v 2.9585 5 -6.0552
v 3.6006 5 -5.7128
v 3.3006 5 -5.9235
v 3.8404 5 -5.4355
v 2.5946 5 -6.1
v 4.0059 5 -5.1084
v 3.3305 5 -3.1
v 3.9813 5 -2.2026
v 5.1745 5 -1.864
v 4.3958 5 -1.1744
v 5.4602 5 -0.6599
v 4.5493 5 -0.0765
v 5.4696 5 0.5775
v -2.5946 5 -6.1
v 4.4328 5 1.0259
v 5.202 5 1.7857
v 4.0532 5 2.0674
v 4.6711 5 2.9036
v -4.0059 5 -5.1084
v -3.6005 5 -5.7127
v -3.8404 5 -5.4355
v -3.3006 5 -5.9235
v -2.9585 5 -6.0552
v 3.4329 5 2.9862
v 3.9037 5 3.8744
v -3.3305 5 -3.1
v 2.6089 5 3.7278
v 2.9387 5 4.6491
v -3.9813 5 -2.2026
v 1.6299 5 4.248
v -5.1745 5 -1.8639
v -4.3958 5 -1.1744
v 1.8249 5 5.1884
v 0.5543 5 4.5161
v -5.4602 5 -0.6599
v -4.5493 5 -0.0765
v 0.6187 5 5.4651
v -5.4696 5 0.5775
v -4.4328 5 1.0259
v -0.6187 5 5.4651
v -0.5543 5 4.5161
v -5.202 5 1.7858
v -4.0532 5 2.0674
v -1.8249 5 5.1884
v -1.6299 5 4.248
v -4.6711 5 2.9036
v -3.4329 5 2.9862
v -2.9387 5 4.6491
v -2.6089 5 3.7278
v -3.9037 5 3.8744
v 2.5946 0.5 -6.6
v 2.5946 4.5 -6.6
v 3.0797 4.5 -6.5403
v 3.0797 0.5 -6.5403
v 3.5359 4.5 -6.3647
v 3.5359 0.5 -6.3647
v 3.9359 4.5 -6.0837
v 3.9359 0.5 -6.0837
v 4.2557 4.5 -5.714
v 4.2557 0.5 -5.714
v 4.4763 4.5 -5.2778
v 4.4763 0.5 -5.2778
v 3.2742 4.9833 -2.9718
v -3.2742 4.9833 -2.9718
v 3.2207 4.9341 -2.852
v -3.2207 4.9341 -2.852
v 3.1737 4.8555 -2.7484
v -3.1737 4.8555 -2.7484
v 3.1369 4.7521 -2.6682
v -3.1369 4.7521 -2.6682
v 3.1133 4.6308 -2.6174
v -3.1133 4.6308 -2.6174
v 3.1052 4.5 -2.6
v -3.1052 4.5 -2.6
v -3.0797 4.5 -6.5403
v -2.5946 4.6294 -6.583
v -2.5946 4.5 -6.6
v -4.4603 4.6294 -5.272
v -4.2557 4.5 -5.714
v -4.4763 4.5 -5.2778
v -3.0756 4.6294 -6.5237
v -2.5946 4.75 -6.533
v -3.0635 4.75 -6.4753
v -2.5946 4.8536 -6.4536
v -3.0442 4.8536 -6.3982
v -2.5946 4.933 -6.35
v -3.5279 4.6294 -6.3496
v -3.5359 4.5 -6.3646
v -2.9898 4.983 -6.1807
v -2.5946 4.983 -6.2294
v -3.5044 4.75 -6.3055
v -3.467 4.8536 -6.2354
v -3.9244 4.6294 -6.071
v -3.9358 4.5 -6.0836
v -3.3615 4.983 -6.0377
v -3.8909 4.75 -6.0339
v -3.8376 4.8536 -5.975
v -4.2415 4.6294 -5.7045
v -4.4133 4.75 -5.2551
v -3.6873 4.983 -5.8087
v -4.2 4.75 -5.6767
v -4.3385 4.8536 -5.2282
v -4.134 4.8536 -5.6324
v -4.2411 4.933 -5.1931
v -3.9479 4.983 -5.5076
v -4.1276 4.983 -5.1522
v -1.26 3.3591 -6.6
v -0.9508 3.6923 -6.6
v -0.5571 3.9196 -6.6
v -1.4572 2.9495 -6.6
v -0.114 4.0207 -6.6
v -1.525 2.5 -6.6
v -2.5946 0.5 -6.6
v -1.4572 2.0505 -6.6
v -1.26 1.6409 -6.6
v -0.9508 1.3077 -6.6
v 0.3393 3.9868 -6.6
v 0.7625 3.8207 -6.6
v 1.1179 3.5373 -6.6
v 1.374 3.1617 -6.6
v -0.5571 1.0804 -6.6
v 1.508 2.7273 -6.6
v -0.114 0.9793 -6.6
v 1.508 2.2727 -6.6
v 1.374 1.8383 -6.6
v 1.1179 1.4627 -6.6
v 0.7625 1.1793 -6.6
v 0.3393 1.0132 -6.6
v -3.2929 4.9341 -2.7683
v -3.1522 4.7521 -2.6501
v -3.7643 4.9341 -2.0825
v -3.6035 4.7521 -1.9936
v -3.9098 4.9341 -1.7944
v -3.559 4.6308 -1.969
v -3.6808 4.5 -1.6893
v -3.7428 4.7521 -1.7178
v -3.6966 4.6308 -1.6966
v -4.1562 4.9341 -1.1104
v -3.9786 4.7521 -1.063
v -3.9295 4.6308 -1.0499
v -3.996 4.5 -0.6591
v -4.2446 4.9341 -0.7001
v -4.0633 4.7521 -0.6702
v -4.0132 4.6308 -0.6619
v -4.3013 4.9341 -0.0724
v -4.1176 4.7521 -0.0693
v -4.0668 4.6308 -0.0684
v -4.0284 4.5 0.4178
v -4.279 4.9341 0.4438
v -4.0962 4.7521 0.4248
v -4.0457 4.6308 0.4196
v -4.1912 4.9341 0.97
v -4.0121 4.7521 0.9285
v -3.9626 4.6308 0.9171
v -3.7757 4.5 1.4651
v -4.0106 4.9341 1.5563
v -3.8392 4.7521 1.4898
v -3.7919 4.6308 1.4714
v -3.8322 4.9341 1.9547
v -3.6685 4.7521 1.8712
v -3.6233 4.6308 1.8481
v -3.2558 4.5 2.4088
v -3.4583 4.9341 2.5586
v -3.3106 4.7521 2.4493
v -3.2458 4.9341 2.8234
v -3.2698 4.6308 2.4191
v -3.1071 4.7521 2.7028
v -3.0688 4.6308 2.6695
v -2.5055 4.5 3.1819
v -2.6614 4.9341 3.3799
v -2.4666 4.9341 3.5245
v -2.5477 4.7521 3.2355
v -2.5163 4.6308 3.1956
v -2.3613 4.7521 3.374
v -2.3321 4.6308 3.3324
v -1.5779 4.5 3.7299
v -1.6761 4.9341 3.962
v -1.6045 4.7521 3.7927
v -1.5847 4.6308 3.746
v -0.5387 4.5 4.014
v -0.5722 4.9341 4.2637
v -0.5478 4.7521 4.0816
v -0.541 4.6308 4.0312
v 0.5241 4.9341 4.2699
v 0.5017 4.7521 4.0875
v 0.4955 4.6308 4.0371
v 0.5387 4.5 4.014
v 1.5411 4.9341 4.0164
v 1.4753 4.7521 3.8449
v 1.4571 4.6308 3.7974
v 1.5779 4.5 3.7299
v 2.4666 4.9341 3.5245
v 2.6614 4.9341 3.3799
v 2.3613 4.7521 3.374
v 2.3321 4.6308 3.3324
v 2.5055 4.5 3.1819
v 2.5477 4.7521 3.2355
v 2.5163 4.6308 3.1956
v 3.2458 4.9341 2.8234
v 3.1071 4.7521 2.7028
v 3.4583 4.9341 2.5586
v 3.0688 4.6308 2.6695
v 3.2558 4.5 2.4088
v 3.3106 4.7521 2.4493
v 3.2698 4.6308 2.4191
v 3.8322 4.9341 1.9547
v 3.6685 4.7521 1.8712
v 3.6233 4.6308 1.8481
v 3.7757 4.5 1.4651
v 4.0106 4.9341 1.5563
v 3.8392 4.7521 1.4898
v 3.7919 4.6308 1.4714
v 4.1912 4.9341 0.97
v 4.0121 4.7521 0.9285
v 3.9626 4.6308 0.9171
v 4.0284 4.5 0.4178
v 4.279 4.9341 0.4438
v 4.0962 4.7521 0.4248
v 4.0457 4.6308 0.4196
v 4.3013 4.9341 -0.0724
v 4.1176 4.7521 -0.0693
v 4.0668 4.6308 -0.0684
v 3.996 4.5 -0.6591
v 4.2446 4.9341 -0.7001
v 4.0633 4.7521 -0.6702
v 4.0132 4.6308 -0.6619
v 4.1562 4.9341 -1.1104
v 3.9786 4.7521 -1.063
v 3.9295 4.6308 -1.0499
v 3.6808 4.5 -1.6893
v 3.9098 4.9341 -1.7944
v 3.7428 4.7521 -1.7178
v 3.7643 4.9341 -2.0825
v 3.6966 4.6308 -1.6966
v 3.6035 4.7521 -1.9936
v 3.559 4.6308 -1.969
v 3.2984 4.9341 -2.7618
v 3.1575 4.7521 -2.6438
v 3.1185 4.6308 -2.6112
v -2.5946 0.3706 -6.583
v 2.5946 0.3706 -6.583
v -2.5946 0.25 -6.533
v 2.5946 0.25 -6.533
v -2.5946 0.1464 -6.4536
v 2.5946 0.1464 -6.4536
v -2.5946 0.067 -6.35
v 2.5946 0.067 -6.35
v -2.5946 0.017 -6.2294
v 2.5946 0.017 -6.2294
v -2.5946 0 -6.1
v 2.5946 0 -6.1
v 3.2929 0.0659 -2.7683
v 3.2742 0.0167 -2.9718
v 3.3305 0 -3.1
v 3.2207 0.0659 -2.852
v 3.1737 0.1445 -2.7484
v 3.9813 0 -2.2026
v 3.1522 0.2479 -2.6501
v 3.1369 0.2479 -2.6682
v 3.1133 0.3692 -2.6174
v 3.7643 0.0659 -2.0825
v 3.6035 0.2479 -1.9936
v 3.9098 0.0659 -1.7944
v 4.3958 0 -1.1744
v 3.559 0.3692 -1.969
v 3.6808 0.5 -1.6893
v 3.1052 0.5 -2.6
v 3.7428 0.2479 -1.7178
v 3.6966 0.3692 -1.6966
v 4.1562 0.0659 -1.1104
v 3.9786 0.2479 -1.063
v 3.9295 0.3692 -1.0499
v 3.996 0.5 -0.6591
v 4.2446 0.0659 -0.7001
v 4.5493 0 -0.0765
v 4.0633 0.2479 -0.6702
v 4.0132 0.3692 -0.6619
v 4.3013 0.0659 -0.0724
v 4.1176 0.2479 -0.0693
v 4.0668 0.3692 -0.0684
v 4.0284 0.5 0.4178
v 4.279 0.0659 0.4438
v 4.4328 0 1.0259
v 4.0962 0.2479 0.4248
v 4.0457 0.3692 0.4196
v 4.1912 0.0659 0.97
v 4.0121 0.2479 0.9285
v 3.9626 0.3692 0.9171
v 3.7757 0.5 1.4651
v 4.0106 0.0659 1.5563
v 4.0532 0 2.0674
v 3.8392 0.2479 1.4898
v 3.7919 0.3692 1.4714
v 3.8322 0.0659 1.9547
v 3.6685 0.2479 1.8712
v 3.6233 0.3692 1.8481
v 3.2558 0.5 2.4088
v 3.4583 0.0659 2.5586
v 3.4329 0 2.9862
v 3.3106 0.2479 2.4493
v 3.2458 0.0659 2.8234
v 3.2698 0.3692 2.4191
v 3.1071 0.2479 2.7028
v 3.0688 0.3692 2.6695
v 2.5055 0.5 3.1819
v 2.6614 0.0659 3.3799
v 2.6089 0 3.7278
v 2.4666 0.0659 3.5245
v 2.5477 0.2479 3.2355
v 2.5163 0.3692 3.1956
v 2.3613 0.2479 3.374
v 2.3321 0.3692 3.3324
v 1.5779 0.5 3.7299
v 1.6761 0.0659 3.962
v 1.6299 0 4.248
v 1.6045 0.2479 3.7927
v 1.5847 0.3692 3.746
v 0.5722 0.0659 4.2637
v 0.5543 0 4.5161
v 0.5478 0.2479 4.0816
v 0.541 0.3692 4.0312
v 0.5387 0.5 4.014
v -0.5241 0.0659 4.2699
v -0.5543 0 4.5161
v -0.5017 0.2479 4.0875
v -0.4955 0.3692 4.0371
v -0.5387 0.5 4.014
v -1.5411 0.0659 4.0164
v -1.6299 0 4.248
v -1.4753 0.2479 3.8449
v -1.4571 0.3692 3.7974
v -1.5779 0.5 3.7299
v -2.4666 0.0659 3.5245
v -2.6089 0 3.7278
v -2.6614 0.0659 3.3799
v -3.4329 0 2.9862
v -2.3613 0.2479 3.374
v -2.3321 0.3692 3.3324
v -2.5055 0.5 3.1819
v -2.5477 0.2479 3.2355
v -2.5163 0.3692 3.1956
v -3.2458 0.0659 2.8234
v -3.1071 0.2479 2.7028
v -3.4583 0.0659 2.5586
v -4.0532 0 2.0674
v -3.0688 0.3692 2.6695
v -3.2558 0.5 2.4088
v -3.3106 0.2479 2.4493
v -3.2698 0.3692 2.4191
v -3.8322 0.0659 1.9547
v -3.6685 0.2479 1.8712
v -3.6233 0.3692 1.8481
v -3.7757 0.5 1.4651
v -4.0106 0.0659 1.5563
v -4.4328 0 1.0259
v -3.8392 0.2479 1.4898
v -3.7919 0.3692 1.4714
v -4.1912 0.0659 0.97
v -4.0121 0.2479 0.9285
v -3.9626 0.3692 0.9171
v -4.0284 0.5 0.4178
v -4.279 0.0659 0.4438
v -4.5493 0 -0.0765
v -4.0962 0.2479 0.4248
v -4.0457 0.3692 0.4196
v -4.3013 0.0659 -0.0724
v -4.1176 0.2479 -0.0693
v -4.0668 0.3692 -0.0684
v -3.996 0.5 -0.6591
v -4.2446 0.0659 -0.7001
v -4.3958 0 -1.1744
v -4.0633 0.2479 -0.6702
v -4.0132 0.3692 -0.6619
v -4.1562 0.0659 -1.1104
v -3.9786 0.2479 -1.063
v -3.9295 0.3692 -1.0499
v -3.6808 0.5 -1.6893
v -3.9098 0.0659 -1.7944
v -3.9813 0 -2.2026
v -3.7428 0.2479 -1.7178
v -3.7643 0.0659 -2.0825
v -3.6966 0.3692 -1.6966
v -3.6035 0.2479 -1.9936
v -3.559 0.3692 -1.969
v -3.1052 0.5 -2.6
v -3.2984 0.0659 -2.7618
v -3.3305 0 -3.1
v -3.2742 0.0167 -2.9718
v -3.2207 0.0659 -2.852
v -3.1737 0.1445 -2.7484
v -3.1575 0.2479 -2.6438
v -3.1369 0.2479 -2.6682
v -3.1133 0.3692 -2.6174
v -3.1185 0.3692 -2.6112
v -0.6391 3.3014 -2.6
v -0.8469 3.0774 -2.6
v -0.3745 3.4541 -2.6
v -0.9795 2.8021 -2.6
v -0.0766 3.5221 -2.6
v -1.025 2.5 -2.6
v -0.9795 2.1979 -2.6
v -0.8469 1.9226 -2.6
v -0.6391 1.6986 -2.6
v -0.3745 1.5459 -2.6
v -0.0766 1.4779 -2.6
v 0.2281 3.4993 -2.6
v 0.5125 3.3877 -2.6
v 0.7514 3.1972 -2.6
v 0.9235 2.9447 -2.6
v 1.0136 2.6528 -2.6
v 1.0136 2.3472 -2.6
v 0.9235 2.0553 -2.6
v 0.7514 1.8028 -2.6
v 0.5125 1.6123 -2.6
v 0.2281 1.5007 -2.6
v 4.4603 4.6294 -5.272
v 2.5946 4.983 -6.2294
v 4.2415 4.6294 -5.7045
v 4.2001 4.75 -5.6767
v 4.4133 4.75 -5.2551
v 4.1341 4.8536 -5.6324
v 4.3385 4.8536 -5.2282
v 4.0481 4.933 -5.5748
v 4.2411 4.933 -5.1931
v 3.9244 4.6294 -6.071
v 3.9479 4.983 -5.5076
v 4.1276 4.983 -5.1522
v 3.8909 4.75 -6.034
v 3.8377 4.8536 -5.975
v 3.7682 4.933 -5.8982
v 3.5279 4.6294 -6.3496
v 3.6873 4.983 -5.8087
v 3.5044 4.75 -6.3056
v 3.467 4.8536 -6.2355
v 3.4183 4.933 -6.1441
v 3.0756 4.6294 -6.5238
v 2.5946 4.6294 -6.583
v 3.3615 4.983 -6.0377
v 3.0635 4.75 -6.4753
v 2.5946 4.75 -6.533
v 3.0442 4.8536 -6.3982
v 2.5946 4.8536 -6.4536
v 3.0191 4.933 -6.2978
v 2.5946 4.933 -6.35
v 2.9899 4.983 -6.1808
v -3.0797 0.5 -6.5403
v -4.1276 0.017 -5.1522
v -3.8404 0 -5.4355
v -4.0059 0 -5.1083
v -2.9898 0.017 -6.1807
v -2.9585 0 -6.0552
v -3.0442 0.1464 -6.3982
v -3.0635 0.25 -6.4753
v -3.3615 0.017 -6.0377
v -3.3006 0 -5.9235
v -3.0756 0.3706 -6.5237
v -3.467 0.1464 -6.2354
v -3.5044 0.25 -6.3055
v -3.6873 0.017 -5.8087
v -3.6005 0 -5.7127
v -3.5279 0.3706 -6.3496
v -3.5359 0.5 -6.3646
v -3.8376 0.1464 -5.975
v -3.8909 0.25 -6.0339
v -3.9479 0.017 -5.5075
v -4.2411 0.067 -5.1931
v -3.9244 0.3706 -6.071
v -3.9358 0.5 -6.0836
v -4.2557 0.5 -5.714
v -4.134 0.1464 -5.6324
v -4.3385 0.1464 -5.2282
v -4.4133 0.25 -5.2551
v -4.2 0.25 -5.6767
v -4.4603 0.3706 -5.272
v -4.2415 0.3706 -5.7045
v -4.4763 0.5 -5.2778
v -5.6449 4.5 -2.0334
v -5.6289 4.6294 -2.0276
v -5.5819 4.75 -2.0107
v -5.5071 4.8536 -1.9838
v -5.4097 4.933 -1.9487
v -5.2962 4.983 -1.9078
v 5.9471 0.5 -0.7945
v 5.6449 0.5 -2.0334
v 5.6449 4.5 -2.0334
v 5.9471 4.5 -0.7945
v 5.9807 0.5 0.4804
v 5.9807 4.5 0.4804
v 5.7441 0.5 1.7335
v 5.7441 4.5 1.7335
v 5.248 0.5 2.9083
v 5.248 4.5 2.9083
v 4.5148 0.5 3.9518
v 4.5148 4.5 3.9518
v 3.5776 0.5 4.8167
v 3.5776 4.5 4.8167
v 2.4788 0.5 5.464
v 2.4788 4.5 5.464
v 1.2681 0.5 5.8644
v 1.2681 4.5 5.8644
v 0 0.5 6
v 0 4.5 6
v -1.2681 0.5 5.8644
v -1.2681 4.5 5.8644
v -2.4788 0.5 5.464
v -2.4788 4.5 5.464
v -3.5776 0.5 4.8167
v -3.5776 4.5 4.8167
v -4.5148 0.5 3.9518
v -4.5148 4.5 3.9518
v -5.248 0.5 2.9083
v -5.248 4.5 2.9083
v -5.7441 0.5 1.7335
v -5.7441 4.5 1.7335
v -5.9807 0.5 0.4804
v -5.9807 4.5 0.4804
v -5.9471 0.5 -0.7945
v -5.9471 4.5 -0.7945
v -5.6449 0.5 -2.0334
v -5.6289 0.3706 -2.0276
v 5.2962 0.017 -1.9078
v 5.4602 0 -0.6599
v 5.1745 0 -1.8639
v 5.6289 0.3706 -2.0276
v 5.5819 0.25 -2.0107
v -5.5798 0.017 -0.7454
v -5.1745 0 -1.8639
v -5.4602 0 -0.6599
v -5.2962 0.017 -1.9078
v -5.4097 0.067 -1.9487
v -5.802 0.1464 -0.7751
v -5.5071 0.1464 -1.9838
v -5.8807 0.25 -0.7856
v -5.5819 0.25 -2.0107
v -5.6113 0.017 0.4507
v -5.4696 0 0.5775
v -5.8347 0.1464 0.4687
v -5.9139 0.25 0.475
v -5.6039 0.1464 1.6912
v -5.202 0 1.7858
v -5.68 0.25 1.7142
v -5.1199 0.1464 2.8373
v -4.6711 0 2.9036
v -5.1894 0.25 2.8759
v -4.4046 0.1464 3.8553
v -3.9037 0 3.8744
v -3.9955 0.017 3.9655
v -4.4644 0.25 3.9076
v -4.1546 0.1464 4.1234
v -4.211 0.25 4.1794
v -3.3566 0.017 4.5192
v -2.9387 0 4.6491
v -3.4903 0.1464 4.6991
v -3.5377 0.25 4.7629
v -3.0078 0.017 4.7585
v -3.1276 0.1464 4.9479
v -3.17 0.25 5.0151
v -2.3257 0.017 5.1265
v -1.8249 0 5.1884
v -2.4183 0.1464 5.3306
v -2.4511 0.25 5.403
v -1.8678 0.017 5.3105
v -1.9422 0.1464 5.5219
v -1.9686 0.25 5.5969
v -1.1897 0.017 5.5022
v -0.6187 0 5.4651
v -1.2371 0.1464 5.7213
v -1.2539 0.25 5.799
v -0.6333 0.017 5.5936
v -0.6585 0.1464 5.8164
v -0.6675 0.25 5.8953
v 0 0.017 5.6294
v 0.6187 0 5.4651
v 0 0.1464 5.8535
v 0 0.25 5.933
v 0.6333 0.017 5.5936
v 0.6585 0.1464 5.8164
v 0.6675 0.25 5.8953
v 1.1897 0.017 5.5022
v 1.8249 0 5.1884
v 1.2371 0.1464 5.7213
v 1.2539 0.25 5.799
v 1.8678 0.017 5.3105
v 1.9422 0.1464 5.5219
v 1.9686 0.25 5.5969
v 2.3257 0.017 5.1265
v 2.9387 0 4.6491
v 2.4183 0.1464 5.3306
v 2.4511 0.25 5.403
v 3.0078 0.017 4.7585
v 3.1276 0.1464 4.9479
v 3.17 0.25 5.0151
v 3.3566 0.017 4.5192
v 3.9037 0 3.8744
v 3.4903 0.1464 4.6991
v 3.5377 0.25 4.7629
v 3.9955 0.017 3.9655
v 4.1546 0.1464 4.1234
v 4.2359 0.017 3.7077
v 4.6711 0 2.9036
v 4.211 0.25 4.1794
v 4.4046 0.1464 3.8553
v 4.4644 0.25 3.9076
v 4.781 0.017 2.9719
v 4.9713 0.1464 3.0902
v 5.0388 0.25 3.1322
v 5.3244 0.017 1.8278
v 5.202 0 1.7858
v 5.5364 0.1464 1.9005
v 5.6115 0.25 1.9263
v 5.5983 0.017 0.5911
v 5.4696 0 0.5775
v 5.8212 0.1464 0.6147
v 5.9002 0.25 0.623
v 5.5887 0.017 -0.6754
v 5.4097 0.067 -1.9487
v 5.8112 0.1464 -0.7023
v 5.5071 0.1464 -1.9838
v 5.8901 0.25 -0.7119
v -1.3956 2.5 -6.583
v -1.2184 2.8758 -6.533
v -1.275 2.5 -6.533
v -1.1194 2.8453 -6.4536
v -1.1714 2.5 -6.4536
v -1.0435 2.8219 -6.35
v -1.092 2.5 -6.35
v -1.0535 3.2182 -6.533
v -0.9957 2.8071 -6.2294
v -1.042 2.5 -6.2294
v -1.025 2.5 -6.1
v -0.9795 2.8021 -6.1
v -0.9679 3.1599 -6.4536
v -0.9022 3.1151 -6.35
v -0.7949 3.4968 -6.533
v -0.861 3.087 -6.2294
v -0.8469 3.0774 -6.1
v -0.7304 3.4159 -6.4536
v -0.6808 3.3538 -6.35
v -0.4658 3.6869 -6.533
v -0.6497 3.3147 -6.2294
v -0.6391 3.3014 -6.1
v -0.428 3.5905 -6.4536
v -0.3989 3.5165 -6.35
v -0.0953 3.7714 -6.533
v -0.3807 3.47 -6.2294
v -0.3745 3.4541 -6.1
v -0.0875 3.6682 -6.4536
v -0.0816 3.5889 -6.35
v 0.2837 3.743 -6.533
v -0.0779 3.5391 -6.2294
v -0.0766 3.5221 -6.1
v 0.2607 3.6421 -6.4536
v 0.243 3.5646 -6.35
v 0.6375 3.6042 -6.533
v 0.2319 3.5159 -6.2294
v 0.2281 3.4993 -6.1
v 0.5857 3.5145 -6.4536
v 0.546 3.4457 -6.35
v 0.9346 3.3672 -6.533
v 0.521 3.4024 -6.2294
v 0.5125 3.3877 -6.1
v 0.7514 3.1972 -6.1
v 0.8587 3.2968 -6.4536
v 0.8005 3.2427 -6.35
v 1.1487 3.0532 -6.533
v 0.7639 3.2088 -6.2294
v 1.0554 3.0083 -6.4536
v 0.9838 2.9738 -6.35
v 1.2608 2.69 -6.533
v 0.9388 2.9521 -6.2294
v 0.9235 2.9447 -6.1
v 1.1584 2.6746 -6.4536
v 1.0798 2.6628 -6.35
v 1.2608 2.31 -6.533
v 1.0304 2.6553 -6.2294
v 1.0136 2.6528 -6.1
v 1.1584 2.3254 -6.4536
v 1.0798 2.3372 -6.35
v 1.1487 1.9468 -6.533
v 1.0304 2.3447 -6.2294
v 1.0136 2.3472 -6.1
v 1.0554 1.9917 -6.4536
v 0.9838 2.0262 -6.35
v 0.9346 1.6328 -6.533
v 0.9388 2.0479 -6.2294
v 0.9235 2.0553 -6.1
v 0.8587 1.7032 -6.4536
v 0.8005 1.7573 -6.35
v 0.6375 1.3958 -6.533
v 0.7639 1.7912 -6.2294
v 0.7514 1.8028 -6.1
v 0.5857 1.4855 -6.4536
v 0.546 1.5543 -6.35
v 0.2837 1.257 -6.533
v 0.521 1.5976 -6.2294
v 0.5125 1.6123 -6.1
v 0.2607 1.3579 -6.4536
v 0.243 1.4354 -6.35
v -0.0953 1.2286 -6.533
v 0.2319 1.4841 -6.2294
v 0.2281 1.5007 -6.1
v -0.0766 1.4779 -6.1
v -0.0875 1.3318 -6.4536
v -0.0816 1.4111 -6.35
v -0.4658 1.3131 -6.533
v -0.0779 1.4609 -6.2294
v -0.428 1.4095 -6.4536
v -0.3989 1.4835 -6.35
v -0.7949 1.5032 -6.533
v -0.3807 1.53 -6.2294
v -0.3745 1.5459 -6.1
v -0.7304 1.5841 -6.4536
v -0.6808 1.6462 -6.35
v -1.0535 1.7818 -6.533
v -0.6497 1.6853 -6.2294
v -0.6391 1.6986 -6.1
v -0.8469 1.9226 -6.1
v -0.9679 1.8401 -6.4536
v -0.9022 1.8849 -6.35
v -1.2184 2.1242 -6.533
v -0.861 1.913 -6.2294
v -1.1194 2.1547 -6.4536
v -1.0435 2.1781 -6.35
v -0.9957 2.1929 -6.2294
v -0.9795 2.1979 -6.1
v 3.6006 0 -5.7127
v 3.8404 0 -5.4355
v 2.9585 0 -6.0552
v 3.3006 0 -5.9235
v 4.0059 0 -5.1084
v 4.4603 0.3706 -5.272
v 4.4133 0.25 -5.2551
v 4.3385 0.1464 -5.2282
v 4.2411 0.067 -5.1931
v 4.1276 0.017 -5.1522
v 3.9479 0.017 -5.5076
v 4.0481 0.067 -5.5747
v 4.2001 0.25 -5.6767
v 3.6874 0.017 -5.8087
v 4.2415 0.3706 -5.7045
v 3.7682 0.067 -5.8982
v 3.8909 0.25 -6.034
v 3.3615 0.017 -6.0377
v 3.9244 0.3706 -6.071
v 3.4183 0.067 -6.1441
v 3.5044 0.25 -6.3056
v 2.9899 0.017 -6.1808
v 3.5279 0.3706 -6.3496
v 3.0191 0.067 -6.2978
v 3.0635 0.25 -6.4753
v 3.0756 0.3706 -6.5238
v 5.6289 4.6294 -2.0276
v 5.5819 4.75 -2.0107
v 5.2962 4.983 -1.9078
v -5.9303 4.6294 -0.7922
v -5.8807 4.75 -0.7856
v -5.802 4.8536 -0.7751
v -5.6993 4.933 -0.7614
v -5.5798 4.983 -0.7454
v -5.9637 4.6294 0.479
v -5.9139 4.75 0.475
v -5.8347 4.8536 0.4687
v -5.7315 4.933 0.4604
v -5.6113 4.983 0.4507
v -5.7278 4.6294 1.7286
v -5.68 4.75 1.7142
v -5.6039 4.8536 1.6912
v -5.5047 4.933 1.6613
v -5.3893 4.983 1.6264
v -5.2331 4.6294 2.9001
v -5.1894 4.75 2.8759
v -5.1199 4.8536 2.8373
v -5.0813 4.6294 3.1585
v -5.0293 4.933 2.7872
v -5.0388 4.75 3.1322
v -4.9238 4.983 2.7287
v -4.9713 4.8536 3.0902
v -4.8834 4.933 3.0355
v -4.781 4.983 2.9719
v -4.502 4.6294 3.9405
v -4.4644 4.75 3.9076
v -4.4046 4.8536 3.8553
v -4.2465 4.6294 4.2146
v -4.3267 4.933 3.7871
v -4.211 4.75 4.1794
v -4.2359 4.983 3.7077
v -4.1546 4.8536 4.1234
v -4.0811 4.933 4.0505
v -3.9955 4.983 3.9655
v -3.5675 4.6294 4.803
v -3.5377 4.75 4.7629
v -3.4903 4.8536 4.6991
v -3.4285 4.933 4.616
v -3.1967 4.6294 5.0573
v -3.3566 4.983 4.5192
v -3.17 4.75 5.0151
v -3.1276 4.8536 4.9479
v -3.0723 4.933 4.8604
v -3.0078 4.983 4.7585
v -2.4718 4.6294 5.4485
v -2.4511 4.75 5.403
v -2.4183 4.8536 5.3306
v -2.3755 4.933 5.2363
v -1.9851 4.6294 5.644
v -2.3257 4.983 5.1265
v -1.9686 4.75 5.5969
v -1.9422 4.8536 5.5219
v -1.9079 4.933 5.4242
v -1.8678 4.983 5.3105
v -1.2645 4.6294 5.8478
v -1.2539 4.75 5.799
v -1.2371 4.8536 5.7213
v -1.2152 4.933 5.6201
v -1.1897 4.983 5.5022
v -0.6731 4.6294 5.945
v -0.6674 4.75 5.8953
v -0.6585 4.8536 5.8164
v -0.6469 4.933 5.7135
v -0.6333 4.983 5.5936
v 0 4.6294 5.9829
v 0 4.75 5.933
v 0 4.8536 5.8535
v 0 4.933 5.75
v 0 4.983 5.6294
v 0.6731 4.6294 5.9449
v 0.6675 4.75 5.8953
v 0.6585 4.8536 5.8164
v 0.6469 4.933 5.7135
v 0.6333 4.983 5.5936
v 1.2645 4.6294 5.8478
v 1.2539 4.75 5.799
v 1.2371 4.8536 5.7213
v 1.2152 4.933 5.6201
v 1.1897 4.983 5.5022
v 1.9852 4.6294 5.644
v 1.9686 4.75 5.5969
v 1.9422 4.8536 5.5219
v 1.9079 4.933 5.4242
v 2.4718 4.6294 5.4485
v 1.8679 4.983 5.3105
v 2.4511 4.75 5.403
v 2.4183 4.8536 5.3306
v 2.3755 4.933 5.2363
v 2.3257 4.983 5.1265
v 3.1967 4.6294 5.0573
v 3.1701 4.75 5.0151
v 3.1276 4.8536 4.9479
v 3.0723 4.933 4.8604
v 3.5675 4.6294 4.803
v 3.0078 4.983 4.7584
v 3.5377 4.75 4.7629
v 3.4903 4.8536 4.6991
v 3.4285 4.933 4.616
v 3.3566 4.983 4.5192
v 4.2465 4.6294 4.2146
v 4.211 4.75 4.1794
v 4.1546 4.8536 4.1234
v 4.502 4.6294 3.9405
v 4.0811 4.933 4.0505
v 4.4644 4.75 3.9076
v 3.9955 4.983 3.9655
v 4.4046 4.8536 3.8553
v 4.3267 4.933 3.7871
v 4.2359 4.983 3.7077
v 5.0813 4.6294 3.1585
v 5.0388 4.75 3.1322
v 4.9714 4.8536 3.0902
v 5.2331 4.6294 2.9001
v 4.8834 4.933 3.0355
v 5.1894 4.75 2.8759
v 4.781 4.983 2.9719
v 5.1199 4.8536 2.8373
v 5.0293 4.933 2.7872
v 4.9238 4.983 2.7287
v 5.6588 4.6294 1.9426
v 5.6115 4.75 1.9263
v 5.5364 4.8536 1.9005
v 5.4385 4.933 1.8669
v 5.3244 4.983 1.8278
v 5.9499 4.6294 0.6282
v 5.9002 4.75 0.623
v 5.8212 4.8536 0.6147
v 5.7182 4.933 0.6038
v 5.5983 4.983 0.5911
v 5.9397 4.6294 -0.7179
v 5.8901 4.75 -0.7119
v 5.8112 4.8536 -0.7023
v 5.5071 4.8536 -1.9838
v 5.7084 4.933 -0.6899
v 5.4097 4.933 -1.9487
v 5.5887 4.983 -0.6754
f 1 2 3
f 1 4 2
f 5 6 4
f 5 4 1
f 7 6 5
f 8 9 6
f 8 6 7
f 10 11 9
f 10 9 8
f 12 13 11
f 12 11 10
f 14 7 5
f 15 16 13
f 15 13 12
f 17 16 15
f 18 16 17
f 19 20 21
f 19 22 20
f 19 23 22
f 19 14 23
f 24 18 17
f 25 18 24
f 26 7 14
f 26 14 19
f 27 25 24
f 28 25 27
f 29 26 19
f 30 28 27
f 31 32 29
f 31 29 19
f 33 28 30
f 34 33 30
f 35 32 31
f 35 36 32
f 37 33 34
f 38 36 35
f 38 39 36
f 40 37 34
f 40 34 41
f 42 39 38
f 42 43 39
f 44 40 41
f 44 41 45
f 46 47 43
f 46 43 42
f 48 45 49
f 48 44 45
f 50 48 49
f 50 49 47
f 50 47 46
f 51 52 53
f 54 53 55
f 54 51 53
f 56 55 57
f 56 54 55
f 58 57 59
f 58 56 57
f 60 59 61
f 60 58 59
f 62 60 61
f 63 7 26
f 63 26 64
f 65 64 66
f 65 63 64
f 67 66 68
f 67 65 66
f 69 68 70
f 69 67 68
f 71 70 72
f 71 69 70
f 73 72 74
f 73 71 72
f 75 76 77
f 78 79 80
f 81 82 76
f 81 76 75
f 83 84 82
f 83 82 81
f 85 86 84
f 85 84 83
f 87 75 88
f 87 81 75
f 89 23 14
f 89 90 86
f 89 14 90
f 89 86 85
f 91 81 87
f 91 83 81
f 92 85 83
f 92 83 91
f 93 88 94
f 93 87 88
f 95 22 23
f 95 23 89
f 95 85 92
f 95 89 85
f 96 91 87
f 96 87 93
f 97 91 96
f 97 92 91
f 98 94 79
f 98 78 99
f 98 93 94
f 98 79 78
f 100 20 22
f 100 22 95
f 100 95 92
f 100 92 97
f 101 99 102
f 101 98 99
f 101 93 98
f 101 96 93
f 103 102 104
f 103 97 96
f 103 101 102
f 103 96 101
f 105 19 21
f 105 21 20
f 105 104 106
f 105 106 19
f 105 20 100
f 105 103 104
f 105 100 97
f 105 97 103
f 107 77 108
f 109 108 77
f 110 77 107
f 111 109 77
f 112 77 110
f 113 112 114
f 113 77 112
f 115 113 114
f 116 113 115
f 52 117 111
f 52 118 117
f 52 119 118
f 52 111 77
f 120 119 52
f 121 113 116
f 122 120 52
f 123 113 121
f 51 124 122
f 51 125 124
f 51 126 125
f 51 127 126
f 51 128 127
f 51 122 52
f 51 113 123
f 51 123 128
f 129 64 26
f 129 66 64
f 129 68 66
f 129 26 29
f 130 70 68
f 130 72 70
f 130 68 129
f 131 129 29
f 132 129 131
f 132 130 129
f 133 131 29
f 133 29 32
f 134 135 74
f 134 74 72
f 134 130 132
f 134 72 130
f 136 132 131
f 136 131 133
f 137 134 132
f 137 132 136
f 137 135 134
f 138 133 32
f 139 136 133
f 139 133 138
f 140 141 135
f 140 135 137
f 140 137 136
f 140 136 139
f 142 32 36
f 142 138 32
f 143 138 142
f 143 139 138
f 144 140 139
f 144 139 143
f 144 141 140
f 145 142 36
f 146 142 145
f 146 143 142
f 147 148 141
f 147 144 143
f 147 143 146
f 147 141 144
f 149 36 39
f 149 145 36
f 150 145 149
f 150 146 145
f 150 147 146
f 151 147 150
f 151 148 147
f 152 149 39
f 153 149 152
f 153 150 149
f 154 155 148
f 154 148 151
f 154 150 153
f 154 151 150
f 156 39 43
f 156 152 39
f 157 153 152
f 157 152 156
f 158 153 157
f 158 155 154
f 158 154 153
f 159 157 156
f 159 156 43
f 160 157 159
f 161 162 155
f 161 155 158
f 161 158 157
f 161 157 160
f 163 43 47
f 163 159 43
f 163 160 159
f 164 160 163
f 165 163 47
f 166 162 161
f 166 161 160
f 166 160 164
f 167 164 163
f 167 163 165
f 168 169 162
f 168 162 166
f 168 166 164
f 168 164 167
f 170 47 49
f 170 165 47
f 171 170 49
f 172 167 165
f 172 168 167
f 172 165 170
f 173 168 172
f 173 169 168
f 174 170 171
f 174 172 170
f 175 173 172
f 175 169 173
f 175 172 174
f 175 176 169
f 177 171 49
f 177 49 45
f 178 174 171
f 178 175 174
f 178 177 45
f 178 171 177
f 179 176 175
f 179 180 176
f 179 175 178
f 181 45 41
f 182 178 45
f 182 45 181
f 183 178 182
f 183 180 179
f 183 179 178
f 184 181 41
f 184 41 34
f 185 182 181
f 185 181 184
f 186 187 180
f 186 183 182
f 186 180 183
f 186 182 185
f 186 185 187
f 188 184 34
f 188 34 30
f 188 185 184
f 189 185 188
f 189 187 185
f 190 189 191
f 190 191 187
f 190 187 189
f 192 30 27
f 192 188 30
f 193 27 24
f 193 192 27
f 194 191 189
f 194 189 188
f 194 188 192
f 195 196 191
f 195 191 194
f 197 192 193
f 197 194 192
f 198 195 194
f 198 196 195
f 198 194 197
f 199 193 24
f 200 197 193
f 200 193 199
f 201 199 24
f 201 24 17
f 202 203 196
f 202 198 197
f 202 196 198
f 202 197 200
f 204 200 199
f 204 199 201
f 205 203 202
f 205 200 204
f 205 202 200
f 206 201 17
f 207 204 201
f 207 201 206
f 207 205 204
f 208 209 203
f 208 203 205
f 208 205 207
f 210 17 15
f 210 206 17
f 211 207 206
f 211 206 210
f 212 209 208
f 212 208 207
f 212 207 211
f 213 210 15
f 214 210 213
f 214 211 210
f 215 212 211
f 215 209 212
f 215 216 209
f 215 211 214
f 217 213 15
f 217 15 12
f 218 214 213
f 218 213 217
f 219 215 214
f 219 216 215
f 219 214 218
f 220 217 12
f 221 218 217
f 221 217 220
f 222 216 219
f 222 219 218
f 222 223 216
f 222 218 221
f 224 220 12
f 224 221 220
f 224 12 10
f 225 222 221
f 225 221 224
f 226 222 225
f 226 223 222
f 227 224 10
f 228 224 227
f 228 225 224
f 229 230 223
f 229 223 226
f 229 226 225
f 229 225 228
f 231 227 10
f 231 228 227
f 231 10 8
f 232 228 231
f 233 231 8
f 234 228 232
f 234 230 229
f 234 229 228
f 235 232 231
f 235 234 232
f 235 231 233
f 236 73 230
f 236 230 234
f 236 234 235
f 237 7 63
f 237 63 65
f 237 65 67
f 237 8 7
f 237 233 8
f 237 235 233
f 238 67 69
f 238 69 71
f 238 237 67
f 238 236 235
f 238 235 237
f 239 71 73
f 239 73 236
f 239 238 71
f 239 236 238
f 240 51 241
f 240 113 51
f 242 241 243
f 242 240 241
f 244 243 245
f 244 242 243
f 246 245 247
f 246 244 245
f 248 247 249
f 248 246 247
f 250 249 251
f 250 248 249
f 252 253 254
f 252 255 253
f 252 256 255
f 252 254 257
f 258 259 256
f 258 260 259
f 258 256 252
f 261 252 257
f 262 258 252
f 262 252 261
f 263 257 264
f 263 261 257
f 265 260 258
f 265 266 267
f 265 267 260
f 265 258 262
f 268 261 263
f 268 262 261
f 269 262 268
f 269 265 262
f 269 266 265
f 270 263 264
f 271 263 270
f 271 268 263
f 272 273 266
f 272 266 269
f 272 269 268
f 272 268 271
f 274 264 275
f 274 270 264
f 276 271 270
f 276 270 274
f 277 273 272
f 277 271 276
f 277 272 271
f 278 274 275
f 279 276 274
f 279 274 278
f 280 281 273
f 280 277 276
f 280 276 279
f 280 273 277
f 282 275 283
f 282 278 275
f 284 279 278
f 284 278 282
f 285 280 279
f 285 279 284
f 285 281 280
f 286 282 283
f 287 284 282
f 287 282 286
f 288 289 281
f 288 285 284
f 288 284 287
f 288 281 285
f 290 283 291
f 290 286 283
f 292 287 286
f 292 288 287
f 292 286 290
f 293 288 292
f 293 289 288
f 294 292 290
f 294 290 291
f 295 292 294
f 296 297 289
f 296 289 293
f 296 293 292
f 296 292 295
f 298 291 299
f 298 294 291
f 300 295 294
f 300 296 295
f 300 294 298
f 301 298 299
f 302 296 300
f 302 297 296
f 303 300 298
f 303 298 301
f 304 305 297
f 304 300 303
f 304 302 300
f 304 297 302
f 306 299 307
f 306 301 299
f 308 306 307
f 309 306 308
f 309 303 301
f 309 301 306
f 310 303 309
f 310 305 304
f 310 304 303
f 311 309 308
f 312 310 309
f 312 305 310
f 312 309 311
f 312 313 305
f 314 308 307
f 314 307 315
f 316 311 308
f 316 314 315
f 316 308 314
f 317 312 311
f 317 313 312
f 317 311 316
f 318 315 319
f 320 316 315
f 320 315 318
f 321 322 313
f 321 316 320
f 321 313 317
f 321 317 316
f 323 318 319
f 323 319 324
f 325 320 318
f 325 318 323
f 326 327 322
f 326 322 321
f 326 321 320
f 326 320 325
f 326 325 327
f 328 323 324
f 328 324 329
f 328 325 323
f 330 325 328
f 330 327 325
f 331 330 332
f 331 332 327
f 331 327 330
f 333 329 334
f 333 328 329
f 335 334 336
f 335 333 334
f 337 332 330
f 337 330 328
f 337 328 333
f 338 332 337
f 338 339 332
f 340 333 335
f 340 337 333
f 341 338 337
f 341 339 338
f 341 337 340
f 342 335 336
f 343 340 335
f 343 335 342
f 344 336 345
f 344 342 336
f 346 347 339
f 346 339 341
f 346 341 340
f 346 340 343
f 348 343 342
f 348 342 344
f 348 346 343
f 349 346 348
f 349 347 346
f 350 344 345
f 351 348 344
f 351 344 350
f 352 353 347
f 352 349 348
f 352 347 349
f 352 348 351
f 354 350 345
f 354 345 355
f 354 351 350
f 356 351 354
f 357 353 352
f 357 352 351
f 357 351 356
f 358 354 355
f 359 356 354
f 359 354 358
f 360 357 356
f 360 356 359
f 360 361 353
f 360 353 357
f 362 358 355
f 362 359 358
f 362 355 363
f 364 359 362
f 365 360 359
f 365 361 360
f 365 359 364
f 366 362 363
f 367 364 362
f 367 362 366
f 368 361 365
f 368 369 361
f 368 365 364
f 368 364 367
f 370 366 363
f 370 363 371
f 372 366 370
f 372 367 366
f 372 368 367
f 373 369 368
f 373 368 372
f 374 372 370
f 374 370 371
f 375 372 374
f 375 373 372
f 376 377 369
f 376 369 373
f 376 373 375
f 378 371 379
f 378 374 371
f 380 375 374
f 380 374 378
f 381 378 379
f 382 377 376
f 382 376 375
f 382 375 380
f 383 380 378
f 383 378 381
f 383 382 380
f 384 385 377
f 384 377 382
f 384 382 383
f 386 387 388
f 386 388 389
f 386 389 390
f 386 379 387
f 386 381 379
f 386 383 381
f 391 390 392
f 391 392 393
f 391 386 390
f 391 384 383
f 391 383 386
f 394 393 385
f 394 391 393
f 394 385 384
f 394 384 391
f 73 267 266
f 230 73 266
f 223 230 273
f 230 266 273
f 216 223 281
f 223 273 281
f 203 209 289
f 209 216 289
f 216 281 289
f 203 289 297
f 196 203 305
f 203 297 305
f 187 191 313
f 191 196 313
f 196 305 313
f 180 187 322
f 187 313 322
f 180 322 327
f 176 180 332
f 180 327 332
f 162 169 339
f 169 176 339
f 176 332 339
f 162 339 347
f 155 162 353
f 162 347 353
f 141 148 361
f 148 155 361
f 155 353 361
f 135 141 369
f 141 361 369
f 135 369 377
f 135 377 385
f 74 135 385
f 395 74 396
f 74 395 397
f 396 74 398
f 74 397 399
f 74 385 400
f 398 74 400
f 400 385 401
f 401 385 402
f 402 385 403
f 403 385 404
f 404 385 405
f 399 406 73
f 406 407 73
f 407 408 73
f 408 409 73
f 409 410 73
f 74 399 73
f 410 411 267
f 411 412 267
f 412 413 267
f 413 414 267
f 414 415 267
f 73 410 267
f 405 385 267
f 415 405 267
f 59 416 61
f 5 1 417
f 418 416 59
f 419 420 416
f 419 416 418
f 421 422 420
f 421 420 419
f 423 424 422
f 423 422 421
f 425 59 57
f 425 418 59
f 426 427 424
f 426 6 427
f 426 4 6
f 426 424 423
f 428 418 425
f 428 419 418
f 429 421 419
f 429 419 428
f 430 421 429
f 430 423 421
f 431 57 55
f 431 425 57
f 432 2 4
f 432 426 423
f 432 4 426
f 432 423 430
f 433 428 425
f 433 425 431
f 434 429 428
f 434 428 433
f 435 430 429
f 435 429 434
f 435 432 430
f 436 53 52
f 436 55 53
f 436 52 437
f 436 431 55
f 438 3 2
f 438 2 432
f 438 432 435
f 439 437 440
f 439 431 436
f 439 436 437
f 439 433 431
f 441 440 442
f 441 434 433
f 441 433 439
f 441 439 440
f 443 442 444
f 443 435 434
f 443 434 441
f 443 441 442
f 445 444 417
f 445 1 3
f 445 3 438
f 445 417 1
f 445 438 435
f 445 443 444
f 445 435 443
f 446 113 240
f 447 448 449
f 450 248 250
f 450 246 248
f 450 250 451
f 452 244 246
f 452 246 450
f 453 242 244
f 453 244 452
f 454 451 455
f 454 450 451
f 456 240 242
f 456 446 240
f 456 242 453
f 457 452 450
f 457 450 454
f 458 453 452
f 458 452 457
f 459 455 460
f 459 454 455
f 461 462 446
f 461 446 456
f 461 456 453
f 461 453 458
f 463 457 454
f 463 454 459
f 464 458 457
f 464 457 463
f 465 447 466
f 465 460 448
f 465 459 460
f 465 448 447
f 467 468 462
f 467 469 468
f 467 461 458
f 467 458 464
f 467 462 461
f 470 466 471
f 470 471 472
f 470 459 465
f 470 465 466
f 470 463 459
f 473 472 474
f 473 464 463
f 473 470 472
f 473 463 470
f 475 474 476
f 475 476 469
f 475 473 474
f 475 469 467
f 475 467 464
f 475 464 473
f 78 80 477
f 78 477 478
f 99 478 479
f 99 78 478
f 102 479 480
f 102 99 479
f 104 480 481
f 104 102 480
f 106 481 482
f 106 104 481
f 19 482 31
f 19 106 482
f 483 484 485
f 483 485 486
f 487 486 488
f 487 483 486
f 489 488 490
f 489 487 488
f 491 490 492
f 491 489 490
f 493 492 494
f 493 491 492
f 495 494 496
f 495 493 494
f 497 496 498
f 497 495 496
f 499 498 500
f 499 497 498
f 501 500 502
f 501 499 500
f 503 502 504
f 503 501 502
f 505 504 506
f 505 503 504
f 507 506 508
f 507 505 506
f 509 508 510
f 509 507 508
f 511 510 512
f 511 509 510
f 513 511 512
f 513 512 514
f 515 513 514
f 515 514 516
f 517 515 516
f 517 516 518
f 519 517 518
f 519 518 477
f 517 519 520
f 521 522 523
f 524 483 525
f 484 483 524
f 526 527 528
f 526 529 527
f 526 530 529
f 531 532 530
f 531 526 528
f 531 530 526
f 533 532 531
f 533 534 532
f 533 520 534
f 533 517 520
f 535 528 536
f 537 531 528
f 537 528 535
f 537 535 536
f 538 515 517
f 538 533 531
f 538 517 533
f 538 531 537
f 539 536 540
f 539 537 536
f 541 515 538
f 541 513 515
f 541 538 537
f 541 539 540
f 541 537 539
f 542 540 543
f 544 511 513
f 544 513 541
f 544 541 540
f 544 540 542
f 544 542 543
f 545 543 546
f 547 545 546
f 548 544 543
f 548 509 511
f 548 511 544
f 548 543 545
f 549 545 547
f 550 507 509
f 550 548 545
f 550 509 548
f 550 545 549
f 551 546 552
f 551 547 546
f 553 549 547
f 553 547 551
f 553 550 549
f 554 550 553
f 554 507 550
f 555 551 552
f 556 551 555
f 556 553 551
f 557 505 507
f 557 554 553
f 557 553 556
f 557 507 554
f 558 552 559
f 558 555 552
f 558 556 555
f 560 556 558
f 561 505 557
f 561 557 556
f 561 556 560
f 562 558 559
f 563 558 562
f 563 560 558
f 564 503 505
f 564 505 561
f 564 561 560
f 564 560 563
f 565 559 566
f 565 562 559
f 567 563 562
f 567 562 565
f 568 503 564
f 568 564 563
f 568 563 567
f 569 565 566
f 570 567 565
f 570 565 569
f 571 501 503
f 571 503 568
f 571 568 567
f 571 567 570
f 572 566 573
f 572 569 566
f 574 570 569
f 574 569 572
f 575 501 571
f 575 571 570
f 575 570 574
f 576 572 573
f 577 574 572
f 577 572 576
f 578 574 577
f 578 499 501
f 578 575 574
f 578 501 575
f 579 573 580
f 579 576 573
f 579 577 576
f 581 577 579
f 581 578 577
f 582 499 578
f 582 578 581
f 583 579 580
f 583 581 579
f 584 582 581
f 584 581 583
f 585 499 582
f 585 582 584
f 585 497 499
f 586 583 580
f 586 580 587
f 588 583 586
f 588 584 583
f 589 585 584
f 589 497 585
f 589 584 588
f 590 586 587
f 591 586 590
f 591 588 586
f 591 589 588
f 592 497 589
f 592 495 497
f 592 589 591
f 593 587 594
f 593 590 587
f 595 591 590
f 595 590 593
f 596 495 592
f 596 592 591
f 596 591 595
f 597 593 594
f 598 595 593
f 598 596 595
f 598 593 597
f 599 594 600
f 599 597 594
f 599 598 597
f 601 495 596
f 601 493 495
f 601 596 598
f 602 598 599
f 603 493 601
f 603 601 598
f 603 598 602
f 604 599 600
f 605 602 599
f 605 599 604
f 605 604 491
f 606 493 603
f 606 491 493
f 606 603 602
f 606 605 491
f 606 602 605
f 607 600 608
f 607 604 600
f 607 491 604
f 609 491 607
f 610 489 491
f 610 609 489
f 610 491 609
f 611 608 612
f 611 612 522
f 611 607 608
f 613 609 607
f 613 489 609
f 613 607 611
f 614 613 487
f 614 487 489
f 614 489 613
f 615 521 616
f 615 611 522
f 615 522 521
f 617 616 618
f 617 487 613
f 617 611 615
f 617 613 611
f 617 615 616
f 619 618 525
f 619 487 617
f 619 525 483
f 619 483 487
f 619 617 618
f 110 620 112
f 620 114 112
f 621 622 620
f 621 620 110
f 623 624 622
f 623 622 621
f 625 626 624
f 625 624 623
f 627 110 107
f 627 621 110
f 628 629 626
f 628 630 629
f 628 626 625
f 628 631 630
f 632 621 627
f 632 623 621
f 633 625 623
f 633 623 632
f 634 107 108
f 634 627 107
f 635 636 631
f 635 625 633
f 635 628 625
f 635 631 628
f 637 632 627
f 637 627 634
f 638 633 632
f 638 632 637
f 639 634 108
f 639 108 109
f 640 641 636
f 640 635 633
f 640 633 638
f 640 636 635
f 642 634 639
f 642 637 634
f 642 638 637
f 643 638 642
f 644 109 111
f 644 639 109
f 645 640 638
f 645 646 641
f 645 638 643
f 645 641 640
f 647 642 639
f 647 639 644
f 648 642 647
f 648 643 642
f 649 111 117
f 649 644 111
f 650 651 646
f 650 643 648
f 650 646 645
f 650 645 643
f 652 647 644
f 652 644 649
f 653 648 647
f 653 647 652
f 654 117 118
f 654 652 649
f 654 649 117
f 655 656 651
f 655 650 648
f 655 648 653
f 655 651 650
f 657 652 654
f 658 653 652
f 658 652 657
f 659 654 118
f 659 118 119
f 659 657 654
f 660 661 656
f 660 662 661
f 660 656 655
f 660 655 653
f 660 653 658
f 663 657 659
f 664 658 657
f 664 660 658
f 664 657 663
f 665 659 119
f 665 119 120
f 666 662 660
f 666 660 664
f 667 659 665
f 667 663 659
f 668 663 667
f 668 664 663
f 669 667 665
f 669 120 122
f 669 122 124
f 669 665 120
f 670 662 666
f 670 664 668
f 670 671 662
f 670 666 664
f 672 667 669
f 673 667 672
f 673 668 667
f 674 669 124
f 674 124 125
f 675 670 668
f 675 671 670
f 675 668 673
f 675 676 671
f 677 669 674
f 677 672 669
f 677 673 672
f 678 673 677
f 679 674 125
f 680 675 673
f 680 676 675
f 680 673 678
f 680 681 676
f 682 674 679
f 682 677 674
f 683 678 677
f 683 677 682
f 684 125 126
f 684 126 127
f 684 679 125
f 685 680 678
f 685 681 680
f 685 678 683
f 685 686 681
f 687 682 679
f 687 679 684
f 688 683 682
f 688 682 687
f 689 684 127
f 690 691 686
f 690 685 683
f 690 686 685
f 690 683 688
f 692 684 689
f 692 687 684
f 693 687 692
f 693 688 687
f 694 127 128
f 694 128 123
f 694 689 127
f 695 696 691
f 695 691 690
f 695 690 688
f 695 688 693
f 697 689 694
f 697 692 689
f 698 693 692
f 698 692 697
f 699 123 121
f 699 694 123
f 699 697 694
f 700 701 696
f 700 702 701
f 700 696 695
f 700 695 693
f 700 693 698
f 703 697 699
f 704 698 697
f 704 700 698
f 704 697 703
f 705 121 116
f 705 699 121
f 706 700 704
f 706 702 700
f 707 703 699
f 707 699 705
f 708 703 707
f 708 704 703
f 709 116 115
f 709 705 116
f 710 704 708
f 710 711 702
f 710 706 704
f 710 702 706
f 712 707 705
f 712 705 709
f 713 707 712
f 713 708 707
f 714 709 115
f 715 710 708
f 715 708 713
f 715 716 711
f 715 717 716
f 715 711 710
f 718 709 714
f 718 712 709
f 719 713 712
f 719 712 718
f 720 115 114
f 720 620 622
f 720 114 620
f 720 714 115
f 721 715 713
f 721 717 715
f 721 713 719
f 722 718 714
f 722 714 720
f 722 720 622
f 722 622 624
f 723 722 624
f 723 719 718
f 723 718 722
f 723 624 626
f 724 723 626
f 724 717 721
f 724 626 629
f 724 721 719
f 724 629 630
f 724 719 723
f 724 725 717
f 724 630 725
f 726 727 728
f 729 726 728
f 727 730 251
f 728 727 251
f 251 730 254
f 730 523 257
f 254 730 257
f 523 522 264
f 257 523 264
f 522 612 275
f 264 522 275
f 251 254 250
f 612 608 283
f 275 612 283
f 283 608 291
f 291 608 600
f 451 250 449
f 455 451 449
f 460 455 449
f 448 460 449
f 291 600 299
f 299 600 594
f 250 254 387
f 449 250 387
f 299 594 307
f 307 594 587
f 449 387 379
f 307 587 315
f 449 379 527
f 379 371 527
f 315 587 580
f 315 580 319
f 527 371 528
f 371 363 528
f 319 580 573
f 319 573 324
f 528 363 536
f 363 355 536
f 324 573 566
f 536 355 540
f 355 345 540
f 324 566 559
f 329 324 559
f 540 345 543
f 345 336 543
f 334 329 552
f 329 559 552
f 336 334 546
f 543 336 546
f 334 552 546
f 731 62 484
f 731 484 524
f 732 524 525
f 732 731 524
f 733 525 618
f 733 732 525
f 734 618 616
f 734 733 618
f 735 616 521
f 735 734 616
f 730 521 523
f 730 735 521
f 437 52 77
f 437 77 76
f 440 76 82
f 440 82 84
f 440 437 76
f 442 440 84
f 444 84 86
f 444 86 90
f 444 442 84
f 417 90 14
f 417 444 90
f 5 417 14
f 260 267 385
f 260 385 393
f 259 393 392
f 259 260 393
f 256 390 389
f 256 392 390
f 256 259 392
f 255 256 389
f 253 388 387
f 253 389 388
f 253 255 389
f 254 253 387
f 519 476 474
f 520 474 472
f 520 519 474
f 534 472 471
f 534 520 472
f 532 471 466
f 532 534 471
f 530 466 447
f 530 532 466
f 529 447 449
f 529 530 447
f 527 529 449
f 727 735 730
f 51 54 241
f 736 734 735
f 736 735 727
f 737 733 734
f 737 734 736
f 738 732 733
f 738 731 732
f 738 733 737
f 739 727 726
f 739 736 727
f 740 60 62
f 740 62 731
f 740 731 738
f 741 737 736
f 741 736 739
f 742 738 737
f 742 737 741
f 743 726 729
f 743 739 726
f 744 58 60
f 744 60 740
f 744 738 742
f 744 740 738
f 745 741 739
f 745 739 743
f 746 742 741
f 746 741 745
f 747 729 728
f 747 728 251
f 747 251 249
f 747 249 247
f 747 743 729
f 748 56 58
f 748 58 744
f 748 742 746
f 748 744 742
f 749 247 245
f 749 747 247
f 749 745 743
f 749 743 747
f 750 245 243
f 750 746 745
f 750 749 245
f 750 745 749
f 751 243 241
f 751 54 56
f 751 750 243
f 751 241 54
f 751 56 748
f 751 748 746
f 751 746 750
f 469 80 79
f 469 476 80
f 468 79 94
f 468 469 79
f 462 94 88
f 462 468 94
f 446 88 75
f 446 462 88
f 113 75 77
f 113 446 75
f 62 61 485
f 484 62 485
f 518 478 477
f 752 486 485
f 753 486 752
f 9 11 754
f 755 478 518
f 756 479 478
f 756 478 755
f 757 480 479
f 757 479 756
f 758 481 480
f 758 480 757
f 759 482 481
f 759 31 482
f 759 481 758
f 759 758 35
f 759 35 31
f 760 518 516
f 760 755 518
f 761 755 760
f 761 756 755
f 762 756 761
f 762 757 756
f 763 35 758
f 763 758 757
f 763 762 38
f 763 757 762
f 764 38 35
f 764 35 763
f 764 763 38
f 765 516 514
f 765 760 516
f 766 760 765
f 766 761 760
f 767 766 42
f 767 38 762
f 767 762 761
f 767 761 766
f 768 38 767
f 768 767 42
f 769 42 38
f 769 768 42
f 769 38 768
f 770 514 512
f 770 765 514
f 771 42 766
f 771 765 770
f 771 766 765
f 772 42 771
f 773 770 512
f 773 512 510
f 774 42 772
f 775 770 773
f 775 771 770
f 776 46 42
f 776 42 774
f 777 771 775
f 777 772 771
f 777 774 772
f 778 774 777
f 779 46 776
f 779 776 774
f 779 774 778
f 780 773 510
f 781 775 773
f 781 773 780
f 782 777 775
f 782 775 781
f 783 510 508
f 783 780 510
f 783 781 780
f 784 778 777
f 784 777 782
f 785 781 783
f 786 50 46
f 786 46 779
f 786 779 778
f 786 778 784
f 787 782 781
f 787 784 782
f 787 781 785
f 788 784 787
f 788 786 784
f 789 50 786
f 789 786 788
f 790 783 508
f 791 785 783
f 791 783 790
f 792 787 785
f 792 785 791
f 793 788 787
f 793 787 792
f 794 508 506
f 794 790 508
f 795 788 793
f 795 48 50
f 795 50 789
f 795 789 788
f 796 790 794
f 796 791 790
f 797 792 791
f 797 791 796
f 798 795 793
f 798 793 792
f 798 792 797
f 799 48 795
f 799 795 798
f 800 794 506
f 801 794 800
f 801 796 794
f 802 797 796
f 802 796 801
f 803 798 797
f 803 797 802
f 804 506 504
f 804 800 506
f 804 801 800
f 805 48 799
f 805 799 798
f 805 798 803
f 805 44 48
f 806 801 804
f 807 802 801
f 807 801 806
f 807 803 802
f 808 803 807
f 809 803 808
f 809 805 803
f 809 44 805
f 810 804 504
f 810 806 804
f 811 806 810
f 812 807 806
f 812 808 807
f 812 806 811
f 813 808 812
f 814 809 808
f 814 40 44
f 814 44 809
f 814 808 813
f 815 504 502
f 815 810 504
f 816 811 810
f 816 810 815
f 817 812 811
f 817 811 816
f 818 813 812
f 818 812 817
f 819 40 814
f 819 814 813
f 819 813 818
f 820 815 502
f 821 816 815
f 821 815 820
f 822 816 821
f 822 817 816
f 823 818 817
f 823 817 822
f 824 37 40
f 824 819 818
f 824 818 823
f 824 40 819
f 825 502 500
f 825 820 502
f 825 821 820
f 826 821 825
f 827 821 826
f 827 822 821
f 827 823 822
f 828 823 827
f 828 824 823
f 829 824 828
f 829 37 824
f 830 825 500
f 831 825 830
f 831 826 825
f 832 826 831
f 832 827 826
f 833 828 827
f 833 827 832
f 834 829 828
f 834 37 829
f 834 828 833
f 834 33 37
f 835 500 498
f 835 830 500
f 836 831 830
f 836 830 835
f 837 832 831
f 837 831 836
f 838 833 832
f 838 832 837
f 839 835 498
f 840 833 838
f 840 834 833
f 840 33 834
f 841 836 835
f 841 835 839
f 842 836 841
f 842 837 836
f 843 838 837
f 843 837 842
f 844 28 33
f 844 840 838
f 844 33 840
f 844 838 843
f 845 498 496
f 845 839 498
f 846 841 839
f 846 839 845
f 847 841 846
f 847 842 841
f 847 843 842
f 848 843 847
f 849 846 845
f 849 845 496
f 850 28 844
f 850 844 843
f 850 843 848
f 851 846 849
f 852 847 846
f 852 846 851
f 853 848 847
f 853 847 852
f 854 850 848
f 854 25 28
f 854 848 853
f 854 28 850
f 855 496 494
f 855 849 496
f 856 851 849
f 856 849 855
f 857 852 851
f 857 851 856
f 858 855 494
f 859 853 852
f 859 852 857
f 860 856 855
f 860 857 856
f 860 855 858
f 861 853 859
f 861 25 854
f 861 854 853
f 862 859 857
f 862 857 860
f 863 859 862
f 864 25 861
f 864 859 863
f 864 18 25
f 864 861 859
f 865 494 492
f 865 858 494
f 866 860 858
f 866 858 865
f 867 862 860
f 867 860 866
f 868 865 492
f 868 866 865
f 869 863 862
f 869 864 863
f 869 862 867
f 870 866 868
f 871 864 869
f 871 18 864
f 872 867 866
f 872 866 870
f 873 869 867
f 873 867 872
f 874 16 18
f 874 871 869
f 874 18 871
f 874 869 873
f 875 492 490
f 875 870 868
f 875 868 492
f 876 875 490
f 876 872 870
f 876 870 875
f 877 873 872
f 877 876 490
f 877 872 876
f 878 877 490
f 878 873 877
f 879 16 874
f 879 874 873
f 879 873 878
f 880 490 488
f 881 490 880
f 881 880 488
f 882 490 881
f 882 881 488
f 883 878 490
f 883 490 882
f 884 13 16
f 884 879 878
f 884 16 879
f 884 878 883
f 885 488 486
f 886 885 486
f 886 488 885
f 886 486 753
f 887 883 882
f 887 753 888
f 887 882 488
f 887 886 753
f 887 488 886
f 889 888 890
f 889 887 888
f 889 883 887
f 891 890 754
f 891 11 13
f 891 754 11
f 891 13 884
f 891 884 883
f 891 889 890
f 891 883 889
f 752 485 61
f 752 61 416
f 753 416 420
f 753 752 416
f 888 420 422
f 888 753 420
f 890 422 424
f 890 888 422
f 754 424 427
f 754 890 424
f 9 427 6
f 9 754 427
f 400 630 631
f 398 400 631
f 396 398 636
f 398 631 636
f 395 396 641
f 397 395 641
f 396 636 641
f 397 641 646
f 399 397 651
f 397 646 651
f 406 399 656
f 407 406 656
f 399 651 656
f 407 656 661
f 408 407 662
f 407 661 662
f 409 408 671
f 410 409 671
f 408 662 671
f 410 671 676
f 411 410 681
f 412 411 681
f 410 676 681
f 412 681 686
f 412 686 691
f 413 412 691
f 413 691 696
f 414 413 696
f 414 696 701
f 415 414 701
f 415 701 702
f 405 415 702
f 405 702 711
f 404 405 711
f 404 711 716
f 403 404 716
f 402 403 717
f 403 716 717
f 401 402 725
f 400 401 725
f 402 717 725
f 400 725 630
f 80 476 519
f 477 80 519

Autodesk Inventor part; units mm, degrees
ref_plane "YZ Plane" through (0, 0, 0) normal (1, 0, 0) x (0, 1, 0)
ref_plane "XZ Plane" through (0, 0, 0) normal (0, 1, 0) x (-1, 0, 0)
ref_plane "XY Plane" through (0, 0, 0) normal (0, 0, 1) x (1, 0, 0)
sketch "Sketch1" plane through (0, 0, 0) normal (0, 1, 0) x (-1, 0, 0)
  arc A0 (3.1052, -2.6) -> (-3.1052, -2.6) centre (0, 0) ccw
  line L0 (3.1052, -2.6) -> (-3.1052, -2.6)
  line L1 (0, 0) -> (0, -8.9628) construction
  line L2 (0, -4.05) -> (-4.05, -4.05) construction
  line L3 (-4.05, -4.05) -> (-4.05, 0) construction
  arc A1 (5.6449, -2.0334) -> (-5.6449, -2.0334) centre (0, 0) ccw
  arc A2 (0, -4.05) -> (3.1052, -2.6) centre (0, 0) ccw construction
  arc A3 (-3.1052, -2.6) -> (0, -4.05) centre (0, 0) ccw construction
  line L4 (2.5946, -6.6) -> (-2.5946, -6.6)
  line L5 (4.4763, -5.2778) -> (5.6449, -2.0334)
  line L6 (-4.4763, -5.2778) -> (-5.6449, -2.0334)
  arc A4 (2.5946, -6.6) -> (4.4763, -5.2778) centre (2.5946, -4.6) ccw
  arc A5 (-4.4763, -5.2778) -> (-2.5946, -6.6) centre (-2.5946, -4.6) ccw
  arc A6 (0, -6) -> (5.6449, -2.0334) centre (0, 0) ccw construction
  arc A7 (-5.6449, -2.0334) -> (0, -6) centre (0, 0) ccw construction
  point P0 (4, -6.6)
  point P1 (-4, -6.6)
  point P2 (0, -6.6)
  dimension "d0" = 8.1
  dimension "d1" = 2.6
  dimension "d2" = 12
  dimension "d3" = 4
  dimension "d4" = 8
  dimension "d5" = 2
extrude "Extrusion1" add sketch "Sketch1" along normal blind 5
sketch "Sketch2" plane through (2.5946, 0, -6.6) normal (0, 0, -1) x (-1, 0, 0)
  line L0 (0, 0) -> (5.1892, 0) projected
  line L1 (5.1892, 0) -> (5.1892, 5) projected
  line L2 (0, 5) -> (5.1892, 5) projected
  line L3 (0, 0) -> (0, 5) projected
  line L4 (5.1892, 2.5) -> (0, 2.5) construction
  line L5 (2.5946, 5) -> (2.5946, 0) construction
  circle A0 centre (2.5946, 2.5) radius 1.025
  dimension "d8" = 2.05
extrude "Extrusion2" cut sketch "Sketch2" against normal blind 5 contours A0
fillet "Fillet1" radius 0.5 1 edges at (1.025, 2.5, -6.6)
fillet "Fillet2" radius 0.5 16 edges at (0, 5, 4.05) (0, 0, 4.05) (0, 0, -2.6) (0, 5, -2.6) (0, 0, 6) (5.0606, 0, -3.6556) (3.7445, 0, -6.2364) (0, 0, -6.6) (-3.7445, 0, -6.2364) (-5.0606, 0, -3.6556) (0, 5, -6.6) (-3.7445, 5, -6.2364) (-5.0606, 5, -3.6556) (0, 5, 6) (5.0606, 5, -3.6556) (3.7445, 5, -6.2364)
properties part number "ShaftLock-8mm"
